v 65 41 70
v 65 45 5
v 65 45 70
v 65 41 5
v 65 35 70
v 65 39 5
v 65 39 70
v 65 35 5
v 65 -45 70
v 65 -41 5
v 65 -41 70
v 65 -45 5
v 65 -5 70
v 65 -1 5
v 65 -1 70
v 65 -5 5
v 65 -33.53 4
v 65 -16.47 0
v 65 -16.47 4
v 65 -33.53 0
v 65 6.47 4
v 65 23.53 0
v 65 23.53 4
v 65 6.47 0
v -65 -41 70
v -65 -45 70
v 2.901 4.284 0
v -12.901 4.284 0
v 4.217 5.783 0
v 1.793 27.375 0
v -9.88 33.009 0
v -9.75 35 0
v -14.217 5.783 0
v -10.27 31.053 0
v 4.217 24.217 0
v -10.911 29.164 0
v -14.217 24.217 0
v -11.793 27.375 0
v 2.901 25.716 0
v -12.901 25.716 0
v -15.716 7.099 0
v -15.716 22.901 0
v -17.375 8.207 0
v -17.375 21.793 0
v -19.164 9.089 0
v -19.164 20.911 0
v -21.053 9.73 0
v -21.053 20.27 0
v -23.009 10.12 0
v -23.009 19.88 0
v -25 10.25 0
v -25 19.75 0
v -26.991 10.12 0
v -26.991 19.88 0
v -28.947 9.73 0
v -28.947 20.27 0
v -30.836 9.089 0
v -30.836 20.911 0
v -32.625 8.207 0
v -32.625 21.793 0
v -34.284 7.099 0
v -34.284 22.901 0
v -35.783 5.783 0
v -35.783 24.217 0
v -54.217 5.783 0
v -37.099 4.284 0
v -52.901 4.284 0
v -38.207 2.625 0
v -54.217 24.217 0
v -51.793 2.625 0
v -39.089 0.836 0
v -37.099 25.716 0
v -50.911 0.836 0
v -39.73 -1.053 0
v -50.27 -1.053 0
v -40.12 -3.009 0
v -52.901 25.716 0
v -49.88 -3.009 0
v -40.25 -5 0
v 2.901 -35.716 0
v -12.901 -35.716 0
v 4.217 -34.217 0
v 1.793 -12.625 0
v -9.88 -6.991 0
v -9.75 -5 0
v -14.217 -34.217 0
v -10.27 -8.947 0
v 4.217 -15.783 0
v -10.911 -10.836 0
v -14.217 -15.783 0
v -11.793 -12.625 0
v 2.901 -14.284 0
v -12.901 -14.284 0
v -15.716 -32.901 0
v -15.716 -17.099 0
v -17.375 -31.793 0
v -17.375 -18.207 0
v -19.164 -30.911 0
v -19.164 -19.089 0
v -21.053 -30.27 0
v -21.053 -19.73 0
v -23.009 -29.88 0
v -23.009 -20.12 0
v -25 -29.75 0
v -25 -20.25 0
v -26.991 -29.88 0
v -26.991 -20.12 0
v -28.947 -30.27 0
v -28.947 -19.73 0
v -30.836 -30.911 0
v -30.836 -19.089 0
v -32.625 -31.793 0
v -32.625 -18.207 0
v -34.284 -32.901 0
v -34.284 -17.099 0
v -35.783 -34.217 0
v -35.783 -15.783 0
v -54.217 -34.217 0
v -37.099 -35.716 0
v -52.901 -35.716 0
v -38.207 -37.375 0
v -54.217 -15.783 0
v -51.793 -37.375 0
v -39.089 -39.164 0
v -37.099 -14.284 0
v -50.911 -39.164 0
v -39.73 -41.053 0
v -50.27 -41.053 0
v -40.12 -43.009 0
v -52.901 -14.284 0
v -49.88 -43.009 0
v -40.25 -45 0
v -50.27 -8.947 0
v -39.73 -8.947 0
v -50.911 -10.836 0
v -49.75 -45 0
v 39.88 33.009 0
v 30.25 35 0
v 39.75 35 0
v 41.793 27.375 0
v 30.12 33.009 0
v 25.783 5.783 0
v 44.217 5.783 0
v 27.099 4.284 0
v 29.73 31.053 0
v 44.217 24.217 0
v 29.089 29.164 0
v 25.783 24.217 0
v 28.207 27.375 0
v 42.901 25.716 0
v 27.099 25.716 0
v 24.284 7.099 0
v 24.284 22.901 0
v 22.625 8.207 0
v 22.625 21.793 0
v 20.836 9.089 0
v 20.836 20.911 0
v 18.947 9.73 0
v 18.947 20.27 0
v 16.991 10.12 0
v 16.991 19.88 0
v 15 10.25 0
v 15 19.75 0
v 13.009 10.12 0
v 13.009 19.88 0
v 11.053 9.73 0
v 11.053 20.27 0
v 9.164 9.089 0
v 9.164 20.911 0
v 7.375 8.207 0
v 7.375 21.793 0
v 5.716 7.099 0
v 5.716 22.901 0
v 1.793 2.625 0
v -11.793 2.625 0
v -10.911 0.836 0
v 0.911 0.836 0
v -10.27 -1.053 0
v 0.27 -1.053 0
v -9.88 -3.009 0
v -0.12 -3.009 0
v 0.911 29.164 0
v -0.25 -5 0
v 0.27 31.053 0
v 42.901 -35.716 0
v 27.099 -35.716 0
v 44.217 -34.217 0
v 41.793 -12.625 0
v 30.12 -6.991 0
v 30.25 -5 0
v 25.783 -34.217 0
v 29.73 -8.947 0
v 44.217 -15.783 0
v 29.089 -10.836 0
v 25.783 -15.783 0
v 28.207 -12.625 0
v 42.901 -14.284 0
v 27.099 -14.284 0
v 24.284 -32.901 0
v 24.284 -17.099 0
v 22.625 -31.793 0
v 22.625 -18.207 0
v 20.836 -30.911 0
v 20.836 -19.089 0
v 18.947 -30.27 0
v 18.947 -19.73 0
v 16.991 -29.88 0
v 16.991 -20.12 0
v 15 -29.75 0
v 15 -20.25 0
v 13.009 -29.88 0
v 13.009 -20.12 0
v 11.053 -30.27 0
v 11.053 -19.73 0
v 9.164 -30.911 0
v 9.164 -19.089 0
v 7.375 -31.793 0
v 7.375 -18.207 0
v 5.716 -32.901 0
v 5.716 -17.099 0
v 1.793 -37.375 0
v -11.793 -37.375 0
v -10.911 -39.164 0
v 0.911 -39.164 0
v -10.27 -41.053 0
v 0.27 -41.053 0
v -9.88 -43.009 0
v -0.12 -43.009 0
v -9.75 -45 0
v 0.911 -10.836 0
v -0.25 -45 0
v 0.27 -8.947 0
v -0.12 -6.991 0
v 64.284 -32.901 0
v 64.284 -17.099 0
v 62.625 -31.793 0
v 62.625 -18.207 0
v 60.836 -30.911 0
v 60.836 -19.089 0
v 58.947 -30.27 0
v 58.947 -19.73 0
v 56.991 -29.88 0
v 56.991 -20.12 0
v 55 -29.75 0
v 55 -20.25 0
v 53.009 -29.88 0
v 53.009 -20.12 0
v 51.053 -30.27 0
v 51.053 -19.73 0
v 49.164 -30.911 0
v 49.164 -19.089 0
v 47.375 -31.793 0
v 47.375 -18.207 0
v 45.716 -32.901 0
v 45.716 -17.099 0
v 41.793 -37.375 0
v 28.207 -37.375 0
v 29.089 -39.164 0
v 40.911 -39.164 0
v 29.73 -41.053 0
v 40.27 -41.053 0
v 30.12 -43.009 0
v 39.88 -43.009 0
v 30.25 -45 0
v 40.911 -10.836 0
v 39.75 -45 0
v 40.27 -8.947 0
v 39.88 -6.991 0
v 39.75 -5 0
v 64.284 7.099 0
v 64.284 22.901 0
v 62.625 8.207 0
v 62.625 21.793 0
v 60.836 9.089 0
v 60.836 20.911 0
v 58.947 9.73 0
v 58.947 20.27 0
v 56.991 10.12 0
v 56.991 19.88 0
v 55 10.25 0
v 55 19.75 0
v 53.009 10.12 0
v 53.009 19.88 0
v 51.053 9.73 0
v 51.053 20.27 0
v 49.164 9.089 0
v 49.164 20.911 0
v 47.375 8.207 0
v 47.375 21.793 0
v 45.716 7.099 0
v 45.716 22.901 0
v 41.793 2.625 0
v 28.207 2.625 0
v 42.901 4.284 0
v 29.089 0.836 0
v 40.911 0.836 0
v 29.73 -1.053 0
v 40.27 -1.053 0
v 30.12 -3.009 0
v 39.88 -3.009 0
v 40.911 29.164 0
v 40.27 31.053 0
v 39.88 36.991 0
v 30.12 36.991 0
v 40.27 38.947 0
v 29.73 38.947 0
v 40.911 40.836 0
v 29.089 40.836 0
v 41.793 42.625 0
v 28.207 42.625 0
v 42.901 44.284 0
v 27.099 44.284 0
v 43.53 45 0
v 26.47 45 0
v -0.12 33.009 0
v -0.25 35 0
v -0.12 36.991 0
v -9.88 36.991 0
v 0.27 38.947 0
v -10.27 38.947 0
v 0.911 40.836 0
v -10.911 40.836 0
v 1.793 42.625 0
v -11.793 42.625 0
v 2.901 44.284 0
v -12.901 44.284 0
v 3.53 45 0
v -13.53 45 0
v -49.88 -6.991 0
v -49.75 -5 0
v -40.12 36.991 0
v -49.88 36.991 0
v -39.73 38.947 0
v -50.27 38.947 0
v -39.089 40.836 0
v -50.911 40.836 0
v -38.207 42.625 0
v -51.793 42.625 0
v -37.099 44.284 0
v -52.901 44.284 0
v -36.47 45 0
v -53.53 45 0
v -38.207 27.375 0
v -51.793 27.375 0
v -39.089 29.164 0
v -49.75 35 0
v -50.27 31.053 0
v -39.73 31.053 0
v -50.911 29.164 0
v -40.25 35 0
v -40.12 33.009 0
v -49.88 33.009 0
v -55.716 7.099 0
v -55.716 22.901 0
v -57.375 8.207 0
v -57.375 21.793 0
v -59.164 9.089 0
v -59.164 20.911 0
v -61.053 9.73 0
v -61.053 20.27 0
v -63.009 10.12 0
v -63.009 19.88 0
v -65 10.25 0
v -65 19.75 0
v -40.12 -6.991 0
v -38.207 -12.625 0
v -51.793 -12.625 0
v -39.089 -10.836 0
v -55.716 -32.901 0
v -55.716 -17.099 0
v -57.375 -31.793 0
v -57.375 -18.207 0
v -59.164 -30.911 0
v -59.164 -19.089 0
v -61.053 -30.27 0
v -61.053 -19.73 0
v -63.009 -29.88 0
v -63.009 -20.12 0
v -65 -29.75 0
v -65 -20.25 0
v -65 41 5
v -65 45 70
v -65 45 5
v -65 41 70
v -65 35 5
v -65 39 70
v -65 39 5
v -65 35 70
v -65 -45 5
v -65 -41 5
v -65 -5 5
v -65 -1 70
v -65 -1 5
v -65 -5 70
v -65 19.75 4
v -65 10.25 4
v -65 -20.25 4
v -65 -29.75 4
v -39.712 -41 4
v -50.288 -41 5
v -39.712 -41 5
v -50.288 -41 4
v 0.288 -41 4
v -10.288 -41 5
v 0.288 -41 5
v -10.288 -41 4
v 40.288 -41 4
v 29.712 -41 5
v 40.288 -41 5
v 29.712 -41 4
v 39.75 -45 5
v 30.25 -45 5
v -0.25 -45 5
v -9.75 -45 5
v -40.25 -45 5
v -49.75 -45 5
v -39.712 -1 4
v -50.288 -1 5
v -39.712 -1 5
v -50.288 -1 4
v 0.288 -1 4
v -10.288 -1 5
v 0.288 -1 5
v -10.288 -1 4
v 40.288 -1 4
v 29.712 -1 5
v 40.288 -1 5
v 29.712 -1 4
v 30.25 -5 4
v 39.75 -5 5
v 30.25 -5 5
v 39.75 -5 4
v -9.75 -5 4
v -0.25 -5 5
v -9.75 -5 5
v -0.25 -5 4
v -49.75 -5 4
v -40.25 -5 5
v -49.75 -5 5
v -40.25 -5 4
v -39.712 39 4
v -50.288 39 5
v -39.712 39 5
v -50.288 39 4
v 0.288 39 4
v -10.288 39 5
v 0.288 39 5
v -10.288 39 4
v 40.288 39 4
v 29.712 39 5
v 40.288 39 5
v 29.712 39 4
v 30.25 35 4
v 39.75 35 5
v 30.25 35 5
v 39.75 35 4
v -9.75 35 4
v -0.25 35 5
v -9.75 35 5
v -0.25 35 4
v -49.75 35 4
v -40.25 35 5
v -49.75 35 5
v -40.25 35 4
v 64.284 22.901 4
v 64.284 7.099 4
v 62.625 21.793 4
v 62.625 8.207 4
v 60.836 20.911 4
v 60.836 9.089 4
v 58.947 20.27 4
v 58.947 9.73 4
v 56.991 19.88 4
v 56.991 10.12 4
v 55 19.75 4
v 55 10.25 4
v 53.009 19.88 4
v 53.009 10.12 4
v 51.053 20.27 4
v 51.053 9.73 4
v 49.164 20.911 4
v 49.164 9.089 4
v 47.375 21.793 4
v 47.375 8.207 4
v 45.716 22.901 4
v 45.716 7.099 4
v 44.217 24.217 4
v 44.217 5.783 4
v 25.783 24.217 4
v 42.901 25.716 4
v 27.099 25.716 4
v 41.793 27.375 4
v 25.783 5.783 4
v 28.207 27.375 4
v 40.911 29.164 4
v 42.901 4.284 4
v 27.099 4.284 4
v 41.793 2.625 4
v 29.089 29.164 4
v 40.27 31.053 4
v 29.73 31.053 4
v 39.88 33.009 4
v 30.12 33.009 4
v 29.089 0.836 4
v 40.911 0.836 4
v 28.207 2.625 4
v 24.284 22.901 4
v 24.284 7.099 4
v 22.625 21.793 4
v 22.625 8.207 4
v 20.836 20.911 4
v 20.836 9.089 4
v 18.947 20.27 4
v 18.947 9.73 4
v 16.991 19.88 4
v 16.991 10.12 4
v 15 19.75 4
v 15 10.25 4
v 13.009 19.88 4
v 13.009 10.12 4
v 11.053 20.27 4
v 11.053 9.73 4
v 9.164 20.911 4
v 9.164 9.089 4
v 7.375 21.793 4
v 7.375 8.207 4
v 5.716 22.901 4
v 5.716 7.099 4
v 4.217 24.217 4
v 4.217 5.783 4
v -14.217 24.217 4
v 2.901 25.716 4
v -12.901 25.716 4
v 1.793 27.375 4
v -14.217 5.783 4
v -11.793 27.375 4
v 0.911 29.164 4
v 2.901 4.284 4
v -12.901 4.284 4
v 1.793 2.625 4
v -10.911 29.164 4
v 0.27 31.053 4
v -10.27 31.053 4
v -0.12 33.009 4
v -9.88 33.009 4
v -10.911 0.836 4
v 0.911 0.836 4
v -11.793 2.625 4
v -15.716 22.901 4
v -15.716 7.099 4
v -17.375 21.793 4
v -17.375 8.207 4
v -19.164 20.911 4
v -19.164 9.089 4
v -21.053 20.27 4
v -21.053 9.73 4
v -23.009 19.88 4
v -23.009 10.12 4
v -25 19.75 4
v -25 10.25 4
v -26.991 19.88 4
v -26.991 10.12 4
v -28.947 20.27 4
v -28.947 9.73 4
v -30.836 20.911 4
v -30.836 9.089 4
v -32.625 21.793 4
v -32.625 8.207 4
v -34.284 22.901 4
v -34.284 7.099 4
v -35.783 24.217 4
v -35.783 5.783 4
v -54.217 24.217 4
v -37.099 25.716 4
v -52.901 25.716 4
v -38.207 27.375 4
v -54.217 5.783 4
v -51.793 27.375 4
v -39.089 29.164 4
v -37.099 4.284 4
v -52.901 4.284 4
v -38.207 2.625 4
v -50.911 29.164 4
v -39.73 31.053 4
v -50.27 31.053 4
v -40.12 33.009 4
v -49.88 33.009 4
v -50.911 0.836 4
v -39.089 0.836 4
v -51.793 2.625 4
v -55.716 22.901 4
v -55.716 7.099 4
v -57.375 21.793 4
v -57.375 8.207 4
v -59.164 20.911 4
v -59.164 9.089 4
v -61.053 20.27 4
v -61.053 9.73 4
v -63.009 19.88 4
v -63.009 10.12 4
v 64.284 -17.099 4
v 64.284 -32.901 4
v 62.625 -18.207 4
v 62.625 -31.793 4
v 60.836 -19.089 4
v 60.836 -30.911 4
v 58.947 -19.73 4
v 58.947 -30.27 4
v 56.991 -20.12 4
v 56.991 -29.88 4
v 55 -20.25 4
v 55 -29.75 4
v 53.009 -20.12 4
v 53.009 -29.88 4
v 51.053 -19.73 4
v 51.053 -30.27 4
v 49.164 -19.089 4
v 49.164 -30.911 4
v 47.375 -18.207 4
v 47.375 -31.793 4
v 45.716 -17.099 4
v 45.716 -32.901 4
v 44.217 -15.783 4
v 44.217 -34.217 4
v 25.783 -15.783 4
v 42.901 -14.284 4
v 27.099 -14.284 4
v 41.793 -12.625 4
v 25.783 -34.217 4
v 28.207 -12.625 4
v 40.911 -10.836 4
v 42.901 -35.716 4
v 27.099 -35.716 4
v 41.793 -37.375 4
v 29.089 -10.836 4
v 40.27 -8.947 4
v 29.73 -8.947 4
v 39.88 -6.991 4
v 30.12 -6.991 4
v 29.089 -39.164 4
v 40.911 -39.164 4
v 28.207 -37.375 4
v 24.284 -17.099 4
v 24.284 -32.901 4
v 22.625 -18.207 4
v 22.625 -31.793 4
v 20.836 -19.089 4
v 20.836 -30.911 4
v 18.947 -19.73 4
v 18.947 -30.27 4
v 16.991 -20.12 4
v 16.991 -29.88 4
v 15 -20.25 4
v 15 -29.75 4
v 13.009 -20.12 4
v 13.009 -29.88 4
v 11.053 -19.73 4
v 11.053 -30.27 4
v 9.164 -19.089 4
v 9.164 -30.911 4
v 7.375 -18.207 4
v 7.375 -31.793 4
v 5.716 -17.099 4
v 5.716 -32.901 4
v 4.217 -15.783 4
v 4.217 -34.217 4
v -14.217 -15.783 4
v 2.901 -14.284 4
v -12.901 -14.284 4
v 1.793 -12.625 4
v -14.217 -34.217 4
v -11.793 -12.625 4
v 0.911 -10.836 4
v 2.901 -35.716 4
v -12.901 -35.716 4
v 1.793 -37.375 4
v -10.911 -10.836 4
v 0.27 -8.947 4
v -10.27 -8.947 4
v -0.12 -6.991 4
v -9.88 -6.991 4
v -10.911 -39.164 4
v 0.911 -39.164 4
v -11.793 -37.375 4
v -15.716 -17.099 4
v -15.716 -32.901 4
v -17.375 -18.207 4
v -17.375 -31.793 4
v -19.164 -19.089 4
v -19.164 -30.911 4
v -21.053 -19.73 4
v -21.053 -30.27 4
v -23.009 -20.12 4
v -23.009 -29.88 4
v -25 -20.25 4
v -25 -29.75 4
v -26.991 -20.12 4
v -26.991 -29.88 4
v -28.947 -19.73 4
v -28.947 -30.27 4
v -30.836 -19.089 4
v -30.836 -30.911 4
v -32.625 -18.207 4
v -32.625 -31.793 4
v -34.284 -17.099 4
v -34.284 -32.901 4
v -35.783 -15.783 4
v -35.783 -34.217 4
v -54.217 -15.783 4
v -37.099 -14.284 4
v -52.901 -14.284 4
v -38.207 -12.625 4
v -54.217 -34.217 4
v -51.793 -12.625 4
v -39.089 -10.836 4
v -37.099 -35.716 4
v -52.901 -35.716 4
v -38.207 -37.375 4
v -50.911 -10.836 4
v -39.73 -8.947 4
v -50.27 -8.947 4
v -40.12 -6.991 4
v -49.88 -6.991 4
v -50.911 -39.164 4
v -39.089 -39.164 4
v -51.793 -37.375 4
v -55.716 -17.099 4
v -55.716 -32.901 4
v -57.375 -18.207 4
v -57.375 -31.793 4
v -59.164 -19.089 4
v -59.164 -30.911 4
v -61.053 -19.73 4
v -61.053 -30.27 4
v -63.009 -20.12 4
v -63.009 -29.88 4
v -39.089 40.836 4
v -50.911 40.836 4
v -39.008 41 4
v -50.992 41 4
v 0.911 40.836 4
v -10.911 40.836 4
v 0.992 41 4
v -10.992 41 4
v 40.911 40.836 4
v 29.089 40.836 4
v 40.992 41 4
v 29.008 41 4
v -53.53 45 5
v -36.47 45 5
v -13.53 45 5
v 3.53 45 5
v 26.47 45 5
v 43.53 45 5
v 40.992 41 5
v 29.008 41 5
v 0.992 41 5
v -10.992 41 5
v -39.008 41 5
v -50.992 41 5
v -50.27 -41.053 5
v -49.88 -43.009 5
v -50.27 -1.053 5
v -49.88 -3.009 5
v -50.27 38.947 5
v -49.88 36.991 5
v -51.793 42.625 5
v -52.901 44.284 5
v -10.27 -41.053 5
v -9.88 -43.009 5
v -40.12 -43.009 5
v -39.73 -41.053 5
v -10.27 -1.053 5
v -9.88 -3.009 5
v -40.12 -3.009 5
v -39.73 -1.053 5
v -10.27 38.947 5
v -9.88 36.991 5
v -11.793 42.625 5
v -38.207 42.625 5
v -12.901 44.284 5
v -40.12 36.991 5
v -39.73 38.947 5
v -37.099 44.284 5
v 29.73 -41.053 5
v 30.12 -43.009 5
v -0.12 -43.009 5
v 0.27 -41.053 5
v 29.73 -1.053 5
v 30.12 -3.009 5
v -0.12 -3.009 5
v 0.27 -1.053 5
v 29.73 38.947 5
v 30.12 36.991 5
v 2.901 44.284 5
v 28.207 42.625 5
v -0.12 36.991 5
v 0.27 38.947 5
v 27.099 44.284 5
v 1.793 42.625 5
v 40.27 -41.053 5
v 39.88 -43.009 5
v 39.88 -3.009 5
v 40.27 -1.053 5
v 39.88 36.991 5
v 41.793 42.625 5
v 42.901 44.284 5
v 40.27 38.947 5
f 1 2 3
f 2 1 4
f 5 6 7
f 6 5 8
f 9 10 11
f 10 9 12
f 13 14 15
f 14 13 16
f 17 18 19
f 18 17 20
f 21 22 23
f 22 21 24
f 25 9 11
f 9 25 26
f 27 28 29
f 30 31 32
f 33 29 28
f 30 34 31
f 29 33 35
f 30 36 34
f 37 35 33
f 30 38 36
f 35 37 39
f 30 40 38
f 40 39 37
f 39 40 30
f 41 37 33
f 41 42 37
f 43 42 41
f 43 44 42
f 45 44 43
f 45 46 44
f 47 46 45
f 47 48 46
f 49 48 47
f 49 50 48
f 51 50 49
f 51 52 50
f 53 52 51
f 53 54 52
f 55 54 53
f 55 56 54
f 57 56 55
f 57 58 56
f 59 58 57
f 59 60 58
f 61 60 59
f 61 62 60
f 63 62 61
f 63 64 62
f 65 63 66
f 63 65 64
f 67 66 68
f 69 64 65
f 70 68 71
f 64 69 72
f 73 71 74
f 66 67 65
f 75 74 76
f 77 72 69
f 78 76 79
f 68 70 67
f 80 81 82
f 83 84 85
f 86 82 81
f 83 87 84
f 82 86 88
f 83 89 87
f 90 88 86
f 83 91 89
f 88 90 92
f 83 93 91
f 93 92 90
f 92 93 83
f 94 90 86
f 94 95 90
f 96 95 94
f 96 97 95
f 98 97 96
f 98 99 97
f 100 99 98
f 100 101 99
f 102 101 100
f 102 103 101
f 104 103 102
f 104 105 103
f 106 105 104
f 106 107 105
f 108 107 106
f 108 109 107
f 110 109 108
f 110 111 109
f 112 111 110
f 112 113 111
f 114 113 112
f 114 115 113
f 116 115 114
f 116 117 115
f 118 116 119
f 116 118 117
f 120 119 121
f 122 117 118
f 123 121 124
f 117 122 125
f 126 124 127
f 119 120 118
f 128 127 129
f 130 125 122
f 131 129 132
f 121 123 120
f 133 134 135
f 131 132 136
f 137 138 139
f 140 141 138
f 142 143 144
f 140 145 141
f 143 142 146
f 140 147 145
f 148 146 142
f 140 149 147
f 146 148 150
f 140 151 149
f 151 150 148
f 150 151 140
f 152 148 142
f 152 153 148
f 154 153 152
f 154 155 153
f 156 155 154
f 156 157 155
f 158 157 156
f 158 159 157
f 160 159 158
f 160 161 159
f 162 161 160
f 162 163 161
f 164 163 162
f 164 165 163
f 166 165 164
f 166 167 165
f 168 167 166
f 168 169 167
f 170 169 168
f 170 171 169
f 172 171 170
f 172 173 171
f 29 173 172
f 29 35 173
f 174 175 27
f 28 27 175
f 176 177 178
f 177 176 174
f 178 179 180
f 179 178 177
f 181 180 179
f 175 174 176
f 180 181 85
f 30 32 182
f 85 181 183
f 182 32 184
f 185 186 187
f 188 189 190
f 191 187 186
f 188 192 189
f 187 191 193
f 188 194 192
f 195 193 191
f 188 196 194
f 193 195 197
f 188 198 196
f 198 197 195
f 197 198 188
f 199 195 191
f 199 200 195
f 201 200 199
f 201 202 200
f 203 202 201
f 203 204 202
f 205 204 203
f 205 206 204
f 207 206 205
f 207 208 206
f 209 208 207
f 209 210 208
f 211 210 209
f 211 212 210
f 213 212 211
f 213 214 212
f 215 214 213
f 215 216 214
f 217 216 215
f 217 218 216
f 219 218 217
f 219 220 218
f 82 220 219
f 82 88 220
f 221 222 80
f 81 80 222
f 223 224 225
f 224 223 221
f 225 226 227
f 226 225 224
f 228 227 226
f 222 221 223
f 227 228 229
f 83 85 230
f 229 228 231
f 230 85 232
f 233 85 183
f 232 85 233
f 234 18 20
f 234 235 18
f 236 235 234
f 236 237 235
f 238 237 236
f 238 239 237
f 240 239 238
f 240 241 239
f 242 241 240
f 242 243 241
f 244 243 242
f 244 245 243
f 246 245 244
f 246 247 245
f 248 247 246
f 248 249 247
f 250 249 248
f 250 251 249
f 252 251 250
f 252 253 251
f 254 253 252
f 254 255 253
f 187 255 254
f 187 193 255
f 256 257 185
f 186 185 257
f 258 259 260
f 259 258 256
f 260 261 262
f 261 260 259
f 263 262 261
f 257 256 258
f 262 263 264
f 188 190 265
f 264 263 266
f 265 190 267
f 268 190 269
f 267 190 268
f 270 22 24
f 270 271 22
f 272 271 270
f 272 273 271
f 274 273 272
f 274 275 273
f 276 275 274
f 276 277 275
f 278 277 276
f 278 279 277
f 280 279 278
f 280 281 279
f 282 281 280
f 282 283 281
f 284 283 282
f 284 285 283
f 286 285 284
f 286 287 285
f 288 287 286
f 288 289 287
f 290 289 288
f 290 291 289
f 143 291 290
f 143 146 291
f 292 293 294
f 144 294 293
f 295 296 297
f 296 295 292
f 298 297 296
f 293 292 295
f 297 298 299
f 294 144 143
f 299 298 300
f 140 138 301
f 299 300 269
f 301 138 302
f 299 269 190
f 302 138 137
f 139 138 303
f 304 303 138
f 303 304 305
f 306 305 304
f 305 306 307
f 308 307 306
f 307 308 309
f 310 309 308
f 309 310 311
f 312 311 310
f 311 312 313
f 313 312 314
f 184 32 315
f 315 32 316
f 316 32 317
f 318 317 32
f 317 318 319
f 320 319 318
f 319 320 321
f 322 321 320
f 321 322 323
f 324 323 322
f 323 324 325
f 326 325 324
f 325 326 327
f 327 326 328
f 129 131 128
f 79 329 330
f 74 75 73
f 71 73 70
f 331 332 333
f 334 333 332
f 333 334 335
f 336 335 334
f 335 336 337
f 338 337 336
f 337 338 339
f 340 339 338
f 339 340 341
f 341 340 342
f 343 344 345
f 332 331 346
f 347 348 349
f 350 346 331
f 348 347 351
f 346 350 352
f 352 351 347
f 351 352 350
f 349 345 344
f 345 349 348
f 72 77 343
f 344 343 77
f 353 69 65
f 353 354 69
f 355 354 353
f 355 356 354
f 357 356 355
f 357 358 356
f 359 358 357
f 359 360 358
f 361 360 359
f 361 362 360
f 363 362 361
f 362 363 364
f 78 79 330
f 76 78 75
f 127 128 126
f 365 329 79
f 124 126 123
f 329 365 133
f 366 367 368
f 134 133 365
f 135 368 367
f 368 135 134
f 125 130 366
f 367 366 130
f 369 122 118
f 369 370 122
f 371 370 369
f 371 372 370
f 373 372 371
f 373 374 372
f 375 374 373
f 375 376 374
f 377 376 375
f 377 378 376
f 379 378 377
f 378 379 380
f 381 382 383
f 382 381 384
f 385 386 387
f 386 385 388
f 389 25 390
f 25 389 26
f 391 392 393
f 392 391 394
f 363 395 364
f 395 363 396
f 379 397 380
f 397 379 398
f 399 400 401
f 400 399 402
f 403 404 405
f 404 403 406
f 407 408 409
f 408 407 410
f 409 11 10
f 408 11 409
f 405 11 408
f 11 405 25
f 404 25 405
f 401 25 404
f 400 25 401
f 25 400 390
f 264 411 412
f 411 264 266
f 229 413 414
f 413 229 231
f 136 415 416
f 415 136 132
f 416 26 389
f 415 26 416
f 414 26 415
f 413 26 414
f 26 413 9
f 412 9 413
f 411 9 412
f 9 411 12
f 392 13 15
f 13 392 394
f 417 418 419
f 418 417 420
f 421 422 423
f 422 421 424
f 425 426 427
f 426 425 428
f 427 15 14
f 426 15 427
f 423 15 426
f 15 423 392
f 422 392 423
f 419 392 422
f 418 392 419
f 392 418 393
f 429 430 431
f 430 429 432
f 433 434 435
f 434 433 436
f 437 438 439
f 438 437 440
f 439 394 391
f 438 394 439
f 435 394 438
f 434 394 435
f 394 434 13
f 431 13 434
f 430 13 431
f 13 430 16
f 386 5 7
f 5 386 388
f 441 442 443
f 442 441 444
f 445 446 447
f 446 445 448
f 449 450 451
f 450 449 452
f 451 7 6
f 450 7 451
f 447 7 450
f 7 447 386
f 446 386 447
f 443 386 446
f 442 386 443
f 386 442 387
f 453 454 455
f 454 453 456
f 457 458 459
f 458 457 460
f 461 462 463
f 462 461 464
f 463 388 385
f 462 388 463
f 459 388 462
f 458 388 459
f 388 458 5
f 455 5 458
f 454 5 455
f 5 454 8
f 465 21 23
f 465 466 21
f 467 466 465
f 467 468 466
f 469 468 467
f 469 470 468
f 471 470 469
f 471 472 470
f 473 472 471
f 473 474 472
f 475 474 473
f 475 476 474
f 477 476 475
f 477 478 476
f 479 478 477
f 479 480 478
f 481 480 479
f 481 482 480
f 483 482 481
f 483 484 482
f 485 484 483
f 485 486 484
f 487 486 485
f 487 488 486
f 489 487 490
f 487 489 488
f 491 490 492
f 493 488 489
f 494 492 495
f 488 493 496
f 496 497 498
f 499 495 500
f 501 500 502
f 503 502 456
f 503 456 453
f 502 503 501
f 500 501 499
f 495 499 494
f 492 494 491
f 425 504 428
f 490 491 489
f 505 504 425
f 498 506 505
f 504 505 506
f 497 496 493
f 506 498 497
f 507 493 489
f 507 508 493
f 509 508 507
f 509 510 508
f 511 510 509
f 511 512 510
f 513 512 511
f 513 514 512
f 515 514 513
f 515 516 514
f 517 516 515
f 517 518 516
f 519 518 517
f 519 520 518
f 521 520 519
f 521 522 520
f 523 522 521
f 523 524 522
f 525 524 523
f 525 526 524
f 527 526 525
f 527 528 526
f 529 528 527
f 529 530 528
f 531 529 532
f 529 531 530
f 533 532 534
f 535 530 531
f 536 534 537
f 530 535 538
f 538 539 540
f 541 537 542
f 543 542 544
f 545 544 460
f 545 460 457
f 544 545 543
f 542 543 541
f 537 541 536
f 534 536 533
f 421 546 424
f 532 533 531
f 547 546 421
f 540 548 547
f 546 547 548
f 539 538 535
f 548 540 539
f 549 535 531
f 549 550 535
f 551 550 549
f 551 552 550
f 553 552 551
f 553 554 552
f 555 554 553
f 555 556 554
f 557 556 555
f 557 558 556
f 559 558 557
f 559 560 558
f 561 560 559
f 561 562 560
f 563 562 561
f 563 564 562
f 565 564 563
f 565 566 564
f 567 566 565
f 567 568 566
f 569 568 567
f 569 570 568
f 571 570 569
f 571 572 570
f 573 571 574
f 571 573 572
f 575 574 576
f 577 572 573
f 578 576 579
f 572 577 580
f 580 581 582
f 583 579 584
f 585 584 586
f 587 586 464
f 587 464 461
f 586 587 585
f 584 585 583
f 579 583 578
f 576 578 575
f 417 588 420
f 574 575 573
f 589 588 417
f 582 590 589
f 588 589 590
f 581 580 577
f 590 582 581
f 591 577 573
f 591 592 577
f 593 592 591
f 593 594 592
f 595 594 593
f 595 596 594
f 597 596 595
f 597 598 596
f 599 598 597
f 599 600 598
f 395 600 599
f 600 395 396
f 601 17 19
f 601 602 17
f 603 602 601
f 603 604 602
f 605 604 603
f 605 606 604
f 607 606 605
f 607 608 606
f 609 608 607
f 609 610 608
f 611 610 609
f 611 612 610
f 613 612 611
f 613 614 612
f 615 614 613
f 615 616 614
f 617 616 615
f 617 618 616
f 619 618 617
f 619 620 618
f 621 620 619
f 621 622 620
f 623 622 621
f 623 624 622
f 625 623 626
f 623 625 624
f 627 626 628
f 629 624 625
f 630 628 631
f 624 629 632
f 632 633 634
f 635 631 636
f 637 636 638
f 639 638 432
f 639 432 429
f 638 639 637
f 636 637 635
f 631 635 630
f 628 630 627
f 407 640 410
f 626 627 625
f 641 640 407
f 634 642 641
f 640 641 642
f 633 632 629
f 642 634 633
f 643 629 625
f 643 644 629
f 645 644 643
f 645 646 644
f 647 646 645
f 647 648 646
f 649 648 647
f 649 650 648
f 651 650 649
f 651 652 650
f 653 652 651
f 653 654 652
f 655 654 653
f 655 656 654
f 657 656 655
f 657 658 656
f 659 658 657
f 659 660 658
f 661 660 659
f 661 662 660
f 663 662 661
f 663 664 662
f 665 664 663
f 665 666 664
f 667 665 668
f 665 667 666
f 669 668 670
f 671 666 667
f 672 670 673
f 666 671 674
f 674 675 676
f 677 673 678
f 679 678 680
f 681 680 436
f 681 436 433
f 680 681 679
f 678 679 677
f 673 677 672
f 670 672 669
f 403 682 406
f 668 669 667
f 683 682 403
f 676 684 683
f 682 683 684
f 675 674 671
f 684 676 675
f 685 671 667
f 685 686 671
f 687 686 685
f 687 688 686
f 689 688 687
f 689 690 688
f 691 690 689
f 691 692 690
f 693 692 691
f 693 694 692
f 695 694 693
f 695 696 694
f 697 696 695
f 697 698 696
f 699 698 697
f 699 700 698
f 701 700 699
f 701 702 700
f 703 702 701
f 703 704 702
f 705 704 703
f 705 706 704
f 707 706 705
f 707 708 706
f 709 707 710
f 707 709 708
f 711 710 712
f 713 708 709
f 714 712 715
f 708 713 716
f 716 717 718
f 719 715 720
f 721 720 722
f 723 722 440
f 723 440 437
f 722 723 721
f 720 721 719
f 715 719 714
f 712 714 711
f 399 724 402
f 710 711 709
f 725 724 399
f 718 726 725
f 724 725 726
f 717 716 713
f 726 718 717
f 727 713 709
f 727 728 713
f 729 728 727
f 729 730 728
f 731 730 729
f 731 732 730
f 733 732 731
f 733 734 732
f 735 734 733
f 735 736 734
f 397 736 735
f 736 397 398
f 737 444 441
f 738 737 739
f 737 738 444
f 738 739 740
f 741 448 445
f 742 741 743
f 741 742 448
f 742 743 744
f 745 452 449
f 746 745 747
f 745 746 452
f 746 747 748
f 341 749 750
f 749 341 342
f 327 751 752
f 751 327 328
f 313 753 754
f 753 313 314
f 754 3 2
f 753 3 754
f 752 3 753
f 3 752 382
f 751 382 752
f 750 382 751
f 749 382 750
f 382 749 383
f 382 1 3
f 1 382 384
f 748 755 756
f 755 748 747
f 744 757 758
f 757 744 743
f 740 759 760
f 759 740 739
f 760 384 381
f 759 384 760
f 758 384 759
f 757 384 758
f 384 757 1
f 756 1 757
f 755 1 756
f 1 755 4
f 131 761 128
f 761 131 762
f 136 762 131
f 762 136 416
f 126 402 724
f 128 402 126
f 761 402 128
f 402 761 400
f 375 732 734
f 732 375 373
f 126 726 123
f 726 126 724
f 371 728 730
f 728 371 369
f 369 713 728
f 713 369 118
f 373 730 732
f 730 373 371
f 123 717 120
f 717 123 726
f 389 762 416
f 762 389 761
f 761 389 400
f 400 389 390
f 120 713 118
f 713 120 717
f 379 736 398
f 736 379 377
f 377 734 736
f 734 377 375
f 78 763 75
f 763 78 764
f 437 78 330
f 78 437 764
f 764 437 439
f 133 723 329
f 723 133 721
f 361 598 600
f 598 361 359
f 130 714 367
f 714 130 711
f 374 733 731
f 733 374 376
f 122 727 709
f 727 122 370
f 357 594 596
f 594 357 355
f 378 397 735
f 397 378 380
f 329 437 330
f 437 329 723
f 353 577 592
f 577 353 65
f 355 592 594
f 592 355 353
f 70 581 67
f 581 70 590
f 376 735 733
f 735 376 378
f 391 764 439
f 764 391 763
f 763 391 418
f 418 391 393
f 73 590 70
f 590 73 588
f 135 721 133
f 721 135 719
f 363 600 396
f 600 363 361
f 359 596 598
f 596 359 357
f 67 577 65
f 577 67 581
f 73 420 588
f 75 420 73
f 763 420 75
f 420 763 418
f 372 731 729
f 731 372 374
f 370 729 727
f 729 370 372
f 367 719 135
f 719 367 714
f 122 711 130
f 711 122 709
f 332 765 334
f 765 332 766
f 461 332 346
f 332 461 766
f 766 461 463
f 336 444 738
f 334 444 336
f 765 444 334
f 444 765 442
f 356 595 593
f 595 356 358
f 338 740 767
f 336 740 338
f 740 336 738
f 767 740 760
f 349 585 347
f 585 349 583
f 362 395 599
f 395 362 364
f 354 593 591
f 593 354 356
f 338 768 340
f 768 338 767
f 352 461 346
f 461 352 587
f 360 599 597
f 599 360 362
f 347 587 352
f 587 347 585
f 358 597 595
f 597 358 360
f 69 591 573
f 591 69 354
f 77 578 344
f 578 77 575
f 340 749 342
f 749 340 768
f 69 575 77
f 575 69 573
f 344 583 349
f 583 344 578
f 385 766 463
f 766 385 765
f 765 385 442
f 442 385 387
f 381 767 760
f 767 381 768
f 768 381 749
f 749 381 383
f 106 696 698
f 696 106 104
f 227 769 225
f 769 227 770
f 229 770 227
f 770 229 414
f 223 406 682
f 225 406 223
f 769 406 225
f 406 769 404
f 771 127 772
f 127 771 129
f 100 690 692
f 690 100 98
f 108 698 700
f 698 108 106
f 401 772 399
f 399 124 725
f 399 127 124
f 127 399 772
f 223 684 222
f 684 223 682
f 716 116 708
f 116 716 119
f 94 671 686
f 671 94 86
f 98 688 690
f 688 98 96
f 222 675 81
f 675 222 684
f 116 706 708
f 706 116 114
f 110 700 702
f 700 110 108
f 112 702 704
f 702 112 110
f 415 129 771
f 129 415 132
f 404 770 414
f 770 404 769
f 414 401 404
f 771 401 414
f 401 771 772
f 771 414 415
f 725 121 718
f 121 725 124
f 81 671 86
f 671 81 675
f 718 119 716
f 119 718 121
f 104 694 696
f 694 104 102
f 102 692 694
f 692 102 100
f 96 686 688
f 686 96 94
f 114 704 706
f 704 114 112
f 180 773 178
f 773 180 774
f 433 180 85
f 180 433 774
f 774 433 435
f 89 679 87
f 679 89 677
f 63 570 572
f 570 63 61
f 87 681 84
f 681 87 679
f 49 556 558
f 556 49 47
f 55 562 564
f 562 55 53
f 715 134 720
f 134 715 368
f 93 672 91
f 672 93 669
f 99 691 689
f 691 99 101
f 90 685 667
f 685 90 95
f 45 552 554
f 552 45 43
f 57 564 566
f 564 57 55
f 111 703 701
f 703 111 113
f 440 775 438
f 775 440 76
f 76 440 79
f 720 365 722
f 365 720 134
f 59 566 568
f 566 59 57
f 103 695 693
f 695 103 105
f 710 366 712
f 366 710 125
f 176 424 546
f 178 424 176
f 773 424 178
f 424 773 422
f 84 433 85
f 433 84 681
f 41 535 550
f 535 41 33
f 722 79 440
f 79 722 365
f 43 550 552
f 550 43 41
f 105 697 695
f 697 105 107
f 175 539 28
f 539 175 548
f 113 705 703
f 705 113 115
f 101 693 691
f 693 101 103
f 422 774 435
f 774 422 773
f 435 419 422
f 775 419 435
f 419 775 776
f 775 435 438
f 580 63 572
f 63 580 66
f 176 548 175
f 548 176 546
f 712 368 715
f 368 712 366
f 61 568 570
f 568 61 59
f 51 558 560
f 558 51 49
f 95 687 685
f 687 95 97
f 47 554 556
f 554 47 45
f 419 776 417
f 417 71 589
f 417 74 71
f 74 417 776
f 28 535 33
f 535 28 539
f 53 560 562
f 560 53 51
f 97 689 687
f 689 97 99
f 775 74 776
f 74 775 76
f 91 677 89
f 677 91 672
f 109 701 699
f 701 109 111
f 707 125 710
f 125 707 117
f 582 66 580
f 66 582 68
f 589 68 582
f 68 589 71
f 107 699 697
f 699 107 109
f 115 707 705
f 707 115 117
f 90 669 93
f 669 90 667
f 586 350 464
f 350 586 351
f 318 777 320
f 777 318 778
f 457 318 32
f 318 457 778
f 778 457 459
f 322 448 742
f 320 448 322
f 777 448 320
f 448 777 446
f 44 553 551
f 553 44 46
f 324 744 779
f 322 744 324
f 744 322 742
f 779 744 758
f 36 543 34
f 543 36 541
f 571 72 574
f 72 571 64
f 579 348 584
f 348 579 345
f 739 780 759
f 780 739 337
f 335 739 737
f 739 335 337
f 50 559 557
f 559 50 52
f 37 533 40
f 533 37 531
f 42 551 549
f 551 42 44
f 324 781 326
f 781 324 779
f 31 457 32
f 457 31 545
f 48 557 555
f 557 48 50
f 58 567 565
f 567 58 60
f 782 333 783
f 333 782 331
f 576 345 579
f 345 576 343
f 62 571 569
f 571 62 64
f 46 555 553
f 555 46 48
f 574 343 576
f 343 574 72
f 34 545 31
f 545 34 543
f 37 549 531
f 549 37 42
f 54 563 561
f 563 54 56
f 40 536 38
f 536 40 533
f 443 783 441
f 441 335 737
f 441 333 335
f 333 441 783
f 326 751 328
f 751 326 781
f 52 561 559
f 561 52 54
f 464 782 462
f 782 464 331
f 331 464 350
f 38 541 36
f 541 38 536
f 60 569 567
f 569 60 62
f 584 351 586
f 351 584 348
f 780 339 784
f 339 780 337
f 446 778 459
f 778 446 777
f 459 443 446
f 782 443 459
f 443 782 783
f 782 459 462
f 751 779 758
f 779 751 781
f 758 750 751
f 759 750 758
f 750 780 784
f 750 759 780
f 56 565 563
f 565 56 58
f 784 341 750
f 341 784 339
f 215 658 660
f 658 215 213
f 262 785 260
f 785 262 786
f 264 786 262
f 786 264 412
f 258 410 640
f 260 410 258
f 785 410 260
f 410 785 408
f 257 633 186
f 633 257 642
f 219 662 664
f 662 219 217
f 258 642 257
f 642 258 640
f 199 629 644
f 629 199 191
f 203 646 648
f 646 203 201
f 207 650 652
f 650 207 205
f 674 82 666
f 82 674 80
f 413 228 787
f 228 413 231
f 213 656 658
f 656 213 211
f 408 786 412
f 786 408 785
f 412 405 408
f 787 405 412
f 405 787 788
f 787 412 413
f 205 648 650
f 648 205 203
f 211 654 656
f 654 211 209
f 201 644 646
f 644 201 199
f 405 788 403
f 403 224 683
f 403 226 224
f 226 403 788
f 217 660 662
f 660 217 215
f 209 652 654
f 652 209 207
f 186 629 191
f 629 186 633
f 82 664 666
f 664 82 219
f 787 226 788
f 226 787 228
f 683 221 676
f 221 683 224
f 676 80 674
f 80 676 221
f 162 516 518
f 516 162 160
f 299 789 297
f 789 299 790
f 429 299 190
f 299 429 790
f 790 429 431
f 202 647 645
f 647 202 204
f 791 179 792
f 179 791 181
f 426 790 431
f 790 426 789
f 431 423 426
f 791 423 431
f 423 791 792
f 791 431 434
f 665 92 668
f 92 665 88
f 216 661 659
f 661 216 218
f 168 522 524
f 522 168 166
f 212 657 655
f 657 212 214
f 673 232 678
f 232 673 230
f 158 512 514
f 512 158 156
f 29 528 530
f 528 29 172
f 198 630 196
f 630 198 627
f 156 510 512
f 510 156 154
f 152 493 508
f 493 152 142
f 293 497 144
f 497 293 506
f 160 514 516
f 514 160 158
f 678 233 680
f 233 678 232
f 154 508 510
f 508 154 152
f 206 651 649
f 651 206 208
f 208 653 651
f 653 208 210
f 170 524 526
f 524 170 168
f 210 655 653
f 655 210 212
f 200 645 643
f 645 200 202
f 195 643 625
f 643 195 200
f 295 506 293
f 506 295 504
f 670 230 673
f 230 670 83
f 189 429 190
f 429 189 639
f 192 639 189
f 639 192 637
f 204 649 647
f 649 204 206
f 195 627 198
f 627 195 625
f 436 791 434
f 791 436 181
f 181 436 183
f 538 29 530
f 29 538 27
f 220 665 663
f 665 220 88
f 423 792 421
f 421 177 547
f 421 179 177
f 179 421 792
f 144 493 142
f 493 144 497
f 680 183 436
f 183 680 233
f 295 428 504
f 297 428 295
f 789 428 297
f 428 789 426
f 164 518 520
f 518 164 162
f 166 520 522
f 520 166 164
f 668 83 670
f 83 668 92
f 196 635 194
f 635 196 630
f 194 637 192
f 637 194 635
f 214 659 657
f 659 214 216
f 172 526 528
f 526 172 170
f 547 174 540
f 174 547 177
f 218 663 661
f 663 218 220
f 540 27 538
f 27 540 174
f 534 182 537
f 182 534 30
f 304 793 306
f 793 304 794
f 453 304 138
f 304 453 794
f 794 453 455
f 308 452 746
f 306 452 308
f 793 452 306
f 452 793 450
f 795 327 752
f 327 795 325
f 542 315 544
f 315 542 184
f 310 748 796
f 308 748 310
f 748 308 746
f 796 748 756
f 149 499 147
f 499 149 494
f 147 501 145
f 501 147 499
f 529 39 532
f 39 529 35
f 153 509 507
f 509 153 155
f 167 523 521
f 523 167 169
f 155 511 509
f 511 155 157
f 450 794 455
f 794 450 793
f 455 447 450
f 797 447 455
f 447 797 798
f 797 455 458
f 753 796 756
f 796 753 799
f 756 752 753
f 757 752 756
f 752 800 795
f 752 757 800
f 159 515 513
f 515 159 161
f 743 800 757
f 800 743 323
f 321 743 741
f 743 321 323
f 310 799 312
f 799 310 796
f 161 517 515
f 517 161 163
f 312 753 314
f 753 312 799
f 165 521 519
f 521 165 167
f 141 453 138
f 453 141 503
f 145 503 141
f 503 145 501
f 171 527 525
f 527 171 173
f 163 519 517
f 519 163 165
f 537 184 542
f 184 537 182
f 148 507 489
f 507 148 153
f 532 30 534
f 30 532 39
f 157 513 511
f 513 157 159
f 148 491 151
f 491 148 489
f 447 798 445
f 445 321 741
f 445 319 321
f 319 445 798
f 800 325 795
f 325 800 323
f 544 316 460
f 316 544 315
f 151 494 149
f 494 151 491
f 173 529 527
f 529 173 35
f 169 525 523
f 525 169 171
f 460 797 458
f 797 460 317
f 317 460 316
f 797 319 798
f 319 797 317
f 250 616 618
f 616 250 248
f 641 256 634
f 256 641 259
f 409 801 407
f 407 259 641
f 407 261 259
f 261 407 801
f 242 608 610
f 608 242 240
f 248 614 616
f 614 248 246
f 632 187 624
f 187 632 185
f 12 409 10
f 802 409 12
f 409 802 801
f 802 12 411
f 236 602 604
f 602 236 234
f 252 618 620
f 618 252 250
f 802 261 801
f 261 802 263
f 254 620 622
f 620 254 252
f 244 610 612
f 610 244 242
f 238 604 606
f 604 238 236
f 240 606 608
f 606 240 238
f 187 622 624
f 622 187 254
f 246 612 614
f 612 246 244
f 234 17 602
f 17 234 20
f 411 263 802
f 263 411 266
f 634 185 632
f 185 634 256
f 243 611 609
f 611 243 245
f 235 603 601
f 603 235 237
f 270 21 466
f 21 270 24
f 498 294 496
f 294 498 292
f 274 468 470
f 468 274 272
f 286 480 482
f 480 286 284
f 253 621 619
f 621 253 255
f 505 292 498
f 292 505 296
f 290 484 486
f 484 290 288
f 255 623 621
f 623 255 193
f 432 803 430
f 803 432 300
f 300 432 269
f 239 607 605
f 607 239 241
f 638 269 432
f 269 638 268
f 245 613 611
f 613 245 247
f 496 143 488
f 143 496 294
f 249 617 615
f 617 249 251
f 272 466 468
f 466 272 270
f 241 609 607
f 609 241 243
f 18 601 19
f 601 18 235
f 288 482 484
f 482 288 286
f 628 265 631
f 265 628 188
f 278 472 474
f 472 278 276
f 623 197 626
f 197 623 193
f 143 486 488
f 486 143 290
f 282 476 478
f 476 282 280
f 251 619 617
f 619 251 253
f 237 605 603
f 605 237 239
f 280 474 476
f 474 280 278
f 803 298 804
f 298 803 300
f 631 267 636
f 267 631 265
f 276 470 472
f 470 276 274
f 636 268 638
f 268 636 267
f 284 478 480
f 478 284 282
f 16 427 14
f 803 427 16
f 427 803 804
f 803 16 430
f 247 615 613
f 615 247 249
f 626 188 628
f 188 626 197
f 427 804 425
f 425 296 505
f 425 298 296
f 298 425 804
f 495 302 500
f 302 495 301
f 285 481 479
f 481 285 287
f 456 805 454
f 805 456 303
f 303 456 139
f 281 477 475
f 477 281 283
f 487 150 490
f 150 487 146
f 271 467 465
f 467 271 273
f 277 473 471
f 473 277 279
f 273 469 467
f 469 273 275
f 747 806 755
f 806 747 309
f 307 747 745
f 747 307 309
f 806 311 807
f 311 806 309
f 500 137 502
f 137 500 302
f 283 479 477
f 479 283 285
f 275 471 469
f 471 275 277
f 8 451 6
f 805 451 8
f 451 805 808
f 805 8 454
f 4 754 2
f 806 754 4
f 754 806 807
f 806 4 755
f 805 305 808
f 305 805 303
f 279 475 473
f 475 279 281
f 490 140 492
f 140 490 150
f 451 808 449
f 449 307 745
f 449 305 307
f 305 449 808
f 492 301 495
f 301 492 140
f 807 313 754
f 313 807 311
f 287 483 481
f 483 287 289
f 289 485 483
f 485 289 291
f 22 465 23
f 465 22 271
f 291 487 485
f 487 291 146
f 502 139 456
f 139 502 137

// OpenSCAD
// Tube rack for six 50 mL conical (Falcon-type) tubes - printed upside down and flipped over.
// A flat plate with a 2x3 hole grid and two solid walls runs along the long edges. The two
// short ends are open. The walls and plate form a U-cross section along the length.
// NOVEL general part.

cols   = 3;
rows   = 2;
tube_d = 30.5;
pitch_x = 40;
pitch_y = 40;
plate_w = 130;
plate_l = 90;
plate_t = 4;
wall_h = 70;

$fn = 48;

plate_z = 4;
wall_t  = 4;

difference() {
    union() {
        translate([-plate_w / 2, -plate_l / 2, 0]) cube([plate_w, plate_l, plate_z]);
        for (y = [-plate_l / 2 : pitch_y : plate_l / 2])
            translate([-plate_w / 2, y, 0]) cube([plate_w, wall_t, wall_h]);
        for (y = [plate_l / 2 - wall_t : pitch_y : plate_l / 2 + wall_t])
            translate([-plate_w / 2, y, 0]) cube([plate_w, wall_t, wall_h]);
    }
    for (x = [-plate_w / 2 : pitch_x : plate_w / 2])
        for (y = [-plate_l / 2 : pitch_y : plate_l / 2])
            translate([x, y, -1]) cylinder(h = plate_z + 2, d = tube_d);
}
